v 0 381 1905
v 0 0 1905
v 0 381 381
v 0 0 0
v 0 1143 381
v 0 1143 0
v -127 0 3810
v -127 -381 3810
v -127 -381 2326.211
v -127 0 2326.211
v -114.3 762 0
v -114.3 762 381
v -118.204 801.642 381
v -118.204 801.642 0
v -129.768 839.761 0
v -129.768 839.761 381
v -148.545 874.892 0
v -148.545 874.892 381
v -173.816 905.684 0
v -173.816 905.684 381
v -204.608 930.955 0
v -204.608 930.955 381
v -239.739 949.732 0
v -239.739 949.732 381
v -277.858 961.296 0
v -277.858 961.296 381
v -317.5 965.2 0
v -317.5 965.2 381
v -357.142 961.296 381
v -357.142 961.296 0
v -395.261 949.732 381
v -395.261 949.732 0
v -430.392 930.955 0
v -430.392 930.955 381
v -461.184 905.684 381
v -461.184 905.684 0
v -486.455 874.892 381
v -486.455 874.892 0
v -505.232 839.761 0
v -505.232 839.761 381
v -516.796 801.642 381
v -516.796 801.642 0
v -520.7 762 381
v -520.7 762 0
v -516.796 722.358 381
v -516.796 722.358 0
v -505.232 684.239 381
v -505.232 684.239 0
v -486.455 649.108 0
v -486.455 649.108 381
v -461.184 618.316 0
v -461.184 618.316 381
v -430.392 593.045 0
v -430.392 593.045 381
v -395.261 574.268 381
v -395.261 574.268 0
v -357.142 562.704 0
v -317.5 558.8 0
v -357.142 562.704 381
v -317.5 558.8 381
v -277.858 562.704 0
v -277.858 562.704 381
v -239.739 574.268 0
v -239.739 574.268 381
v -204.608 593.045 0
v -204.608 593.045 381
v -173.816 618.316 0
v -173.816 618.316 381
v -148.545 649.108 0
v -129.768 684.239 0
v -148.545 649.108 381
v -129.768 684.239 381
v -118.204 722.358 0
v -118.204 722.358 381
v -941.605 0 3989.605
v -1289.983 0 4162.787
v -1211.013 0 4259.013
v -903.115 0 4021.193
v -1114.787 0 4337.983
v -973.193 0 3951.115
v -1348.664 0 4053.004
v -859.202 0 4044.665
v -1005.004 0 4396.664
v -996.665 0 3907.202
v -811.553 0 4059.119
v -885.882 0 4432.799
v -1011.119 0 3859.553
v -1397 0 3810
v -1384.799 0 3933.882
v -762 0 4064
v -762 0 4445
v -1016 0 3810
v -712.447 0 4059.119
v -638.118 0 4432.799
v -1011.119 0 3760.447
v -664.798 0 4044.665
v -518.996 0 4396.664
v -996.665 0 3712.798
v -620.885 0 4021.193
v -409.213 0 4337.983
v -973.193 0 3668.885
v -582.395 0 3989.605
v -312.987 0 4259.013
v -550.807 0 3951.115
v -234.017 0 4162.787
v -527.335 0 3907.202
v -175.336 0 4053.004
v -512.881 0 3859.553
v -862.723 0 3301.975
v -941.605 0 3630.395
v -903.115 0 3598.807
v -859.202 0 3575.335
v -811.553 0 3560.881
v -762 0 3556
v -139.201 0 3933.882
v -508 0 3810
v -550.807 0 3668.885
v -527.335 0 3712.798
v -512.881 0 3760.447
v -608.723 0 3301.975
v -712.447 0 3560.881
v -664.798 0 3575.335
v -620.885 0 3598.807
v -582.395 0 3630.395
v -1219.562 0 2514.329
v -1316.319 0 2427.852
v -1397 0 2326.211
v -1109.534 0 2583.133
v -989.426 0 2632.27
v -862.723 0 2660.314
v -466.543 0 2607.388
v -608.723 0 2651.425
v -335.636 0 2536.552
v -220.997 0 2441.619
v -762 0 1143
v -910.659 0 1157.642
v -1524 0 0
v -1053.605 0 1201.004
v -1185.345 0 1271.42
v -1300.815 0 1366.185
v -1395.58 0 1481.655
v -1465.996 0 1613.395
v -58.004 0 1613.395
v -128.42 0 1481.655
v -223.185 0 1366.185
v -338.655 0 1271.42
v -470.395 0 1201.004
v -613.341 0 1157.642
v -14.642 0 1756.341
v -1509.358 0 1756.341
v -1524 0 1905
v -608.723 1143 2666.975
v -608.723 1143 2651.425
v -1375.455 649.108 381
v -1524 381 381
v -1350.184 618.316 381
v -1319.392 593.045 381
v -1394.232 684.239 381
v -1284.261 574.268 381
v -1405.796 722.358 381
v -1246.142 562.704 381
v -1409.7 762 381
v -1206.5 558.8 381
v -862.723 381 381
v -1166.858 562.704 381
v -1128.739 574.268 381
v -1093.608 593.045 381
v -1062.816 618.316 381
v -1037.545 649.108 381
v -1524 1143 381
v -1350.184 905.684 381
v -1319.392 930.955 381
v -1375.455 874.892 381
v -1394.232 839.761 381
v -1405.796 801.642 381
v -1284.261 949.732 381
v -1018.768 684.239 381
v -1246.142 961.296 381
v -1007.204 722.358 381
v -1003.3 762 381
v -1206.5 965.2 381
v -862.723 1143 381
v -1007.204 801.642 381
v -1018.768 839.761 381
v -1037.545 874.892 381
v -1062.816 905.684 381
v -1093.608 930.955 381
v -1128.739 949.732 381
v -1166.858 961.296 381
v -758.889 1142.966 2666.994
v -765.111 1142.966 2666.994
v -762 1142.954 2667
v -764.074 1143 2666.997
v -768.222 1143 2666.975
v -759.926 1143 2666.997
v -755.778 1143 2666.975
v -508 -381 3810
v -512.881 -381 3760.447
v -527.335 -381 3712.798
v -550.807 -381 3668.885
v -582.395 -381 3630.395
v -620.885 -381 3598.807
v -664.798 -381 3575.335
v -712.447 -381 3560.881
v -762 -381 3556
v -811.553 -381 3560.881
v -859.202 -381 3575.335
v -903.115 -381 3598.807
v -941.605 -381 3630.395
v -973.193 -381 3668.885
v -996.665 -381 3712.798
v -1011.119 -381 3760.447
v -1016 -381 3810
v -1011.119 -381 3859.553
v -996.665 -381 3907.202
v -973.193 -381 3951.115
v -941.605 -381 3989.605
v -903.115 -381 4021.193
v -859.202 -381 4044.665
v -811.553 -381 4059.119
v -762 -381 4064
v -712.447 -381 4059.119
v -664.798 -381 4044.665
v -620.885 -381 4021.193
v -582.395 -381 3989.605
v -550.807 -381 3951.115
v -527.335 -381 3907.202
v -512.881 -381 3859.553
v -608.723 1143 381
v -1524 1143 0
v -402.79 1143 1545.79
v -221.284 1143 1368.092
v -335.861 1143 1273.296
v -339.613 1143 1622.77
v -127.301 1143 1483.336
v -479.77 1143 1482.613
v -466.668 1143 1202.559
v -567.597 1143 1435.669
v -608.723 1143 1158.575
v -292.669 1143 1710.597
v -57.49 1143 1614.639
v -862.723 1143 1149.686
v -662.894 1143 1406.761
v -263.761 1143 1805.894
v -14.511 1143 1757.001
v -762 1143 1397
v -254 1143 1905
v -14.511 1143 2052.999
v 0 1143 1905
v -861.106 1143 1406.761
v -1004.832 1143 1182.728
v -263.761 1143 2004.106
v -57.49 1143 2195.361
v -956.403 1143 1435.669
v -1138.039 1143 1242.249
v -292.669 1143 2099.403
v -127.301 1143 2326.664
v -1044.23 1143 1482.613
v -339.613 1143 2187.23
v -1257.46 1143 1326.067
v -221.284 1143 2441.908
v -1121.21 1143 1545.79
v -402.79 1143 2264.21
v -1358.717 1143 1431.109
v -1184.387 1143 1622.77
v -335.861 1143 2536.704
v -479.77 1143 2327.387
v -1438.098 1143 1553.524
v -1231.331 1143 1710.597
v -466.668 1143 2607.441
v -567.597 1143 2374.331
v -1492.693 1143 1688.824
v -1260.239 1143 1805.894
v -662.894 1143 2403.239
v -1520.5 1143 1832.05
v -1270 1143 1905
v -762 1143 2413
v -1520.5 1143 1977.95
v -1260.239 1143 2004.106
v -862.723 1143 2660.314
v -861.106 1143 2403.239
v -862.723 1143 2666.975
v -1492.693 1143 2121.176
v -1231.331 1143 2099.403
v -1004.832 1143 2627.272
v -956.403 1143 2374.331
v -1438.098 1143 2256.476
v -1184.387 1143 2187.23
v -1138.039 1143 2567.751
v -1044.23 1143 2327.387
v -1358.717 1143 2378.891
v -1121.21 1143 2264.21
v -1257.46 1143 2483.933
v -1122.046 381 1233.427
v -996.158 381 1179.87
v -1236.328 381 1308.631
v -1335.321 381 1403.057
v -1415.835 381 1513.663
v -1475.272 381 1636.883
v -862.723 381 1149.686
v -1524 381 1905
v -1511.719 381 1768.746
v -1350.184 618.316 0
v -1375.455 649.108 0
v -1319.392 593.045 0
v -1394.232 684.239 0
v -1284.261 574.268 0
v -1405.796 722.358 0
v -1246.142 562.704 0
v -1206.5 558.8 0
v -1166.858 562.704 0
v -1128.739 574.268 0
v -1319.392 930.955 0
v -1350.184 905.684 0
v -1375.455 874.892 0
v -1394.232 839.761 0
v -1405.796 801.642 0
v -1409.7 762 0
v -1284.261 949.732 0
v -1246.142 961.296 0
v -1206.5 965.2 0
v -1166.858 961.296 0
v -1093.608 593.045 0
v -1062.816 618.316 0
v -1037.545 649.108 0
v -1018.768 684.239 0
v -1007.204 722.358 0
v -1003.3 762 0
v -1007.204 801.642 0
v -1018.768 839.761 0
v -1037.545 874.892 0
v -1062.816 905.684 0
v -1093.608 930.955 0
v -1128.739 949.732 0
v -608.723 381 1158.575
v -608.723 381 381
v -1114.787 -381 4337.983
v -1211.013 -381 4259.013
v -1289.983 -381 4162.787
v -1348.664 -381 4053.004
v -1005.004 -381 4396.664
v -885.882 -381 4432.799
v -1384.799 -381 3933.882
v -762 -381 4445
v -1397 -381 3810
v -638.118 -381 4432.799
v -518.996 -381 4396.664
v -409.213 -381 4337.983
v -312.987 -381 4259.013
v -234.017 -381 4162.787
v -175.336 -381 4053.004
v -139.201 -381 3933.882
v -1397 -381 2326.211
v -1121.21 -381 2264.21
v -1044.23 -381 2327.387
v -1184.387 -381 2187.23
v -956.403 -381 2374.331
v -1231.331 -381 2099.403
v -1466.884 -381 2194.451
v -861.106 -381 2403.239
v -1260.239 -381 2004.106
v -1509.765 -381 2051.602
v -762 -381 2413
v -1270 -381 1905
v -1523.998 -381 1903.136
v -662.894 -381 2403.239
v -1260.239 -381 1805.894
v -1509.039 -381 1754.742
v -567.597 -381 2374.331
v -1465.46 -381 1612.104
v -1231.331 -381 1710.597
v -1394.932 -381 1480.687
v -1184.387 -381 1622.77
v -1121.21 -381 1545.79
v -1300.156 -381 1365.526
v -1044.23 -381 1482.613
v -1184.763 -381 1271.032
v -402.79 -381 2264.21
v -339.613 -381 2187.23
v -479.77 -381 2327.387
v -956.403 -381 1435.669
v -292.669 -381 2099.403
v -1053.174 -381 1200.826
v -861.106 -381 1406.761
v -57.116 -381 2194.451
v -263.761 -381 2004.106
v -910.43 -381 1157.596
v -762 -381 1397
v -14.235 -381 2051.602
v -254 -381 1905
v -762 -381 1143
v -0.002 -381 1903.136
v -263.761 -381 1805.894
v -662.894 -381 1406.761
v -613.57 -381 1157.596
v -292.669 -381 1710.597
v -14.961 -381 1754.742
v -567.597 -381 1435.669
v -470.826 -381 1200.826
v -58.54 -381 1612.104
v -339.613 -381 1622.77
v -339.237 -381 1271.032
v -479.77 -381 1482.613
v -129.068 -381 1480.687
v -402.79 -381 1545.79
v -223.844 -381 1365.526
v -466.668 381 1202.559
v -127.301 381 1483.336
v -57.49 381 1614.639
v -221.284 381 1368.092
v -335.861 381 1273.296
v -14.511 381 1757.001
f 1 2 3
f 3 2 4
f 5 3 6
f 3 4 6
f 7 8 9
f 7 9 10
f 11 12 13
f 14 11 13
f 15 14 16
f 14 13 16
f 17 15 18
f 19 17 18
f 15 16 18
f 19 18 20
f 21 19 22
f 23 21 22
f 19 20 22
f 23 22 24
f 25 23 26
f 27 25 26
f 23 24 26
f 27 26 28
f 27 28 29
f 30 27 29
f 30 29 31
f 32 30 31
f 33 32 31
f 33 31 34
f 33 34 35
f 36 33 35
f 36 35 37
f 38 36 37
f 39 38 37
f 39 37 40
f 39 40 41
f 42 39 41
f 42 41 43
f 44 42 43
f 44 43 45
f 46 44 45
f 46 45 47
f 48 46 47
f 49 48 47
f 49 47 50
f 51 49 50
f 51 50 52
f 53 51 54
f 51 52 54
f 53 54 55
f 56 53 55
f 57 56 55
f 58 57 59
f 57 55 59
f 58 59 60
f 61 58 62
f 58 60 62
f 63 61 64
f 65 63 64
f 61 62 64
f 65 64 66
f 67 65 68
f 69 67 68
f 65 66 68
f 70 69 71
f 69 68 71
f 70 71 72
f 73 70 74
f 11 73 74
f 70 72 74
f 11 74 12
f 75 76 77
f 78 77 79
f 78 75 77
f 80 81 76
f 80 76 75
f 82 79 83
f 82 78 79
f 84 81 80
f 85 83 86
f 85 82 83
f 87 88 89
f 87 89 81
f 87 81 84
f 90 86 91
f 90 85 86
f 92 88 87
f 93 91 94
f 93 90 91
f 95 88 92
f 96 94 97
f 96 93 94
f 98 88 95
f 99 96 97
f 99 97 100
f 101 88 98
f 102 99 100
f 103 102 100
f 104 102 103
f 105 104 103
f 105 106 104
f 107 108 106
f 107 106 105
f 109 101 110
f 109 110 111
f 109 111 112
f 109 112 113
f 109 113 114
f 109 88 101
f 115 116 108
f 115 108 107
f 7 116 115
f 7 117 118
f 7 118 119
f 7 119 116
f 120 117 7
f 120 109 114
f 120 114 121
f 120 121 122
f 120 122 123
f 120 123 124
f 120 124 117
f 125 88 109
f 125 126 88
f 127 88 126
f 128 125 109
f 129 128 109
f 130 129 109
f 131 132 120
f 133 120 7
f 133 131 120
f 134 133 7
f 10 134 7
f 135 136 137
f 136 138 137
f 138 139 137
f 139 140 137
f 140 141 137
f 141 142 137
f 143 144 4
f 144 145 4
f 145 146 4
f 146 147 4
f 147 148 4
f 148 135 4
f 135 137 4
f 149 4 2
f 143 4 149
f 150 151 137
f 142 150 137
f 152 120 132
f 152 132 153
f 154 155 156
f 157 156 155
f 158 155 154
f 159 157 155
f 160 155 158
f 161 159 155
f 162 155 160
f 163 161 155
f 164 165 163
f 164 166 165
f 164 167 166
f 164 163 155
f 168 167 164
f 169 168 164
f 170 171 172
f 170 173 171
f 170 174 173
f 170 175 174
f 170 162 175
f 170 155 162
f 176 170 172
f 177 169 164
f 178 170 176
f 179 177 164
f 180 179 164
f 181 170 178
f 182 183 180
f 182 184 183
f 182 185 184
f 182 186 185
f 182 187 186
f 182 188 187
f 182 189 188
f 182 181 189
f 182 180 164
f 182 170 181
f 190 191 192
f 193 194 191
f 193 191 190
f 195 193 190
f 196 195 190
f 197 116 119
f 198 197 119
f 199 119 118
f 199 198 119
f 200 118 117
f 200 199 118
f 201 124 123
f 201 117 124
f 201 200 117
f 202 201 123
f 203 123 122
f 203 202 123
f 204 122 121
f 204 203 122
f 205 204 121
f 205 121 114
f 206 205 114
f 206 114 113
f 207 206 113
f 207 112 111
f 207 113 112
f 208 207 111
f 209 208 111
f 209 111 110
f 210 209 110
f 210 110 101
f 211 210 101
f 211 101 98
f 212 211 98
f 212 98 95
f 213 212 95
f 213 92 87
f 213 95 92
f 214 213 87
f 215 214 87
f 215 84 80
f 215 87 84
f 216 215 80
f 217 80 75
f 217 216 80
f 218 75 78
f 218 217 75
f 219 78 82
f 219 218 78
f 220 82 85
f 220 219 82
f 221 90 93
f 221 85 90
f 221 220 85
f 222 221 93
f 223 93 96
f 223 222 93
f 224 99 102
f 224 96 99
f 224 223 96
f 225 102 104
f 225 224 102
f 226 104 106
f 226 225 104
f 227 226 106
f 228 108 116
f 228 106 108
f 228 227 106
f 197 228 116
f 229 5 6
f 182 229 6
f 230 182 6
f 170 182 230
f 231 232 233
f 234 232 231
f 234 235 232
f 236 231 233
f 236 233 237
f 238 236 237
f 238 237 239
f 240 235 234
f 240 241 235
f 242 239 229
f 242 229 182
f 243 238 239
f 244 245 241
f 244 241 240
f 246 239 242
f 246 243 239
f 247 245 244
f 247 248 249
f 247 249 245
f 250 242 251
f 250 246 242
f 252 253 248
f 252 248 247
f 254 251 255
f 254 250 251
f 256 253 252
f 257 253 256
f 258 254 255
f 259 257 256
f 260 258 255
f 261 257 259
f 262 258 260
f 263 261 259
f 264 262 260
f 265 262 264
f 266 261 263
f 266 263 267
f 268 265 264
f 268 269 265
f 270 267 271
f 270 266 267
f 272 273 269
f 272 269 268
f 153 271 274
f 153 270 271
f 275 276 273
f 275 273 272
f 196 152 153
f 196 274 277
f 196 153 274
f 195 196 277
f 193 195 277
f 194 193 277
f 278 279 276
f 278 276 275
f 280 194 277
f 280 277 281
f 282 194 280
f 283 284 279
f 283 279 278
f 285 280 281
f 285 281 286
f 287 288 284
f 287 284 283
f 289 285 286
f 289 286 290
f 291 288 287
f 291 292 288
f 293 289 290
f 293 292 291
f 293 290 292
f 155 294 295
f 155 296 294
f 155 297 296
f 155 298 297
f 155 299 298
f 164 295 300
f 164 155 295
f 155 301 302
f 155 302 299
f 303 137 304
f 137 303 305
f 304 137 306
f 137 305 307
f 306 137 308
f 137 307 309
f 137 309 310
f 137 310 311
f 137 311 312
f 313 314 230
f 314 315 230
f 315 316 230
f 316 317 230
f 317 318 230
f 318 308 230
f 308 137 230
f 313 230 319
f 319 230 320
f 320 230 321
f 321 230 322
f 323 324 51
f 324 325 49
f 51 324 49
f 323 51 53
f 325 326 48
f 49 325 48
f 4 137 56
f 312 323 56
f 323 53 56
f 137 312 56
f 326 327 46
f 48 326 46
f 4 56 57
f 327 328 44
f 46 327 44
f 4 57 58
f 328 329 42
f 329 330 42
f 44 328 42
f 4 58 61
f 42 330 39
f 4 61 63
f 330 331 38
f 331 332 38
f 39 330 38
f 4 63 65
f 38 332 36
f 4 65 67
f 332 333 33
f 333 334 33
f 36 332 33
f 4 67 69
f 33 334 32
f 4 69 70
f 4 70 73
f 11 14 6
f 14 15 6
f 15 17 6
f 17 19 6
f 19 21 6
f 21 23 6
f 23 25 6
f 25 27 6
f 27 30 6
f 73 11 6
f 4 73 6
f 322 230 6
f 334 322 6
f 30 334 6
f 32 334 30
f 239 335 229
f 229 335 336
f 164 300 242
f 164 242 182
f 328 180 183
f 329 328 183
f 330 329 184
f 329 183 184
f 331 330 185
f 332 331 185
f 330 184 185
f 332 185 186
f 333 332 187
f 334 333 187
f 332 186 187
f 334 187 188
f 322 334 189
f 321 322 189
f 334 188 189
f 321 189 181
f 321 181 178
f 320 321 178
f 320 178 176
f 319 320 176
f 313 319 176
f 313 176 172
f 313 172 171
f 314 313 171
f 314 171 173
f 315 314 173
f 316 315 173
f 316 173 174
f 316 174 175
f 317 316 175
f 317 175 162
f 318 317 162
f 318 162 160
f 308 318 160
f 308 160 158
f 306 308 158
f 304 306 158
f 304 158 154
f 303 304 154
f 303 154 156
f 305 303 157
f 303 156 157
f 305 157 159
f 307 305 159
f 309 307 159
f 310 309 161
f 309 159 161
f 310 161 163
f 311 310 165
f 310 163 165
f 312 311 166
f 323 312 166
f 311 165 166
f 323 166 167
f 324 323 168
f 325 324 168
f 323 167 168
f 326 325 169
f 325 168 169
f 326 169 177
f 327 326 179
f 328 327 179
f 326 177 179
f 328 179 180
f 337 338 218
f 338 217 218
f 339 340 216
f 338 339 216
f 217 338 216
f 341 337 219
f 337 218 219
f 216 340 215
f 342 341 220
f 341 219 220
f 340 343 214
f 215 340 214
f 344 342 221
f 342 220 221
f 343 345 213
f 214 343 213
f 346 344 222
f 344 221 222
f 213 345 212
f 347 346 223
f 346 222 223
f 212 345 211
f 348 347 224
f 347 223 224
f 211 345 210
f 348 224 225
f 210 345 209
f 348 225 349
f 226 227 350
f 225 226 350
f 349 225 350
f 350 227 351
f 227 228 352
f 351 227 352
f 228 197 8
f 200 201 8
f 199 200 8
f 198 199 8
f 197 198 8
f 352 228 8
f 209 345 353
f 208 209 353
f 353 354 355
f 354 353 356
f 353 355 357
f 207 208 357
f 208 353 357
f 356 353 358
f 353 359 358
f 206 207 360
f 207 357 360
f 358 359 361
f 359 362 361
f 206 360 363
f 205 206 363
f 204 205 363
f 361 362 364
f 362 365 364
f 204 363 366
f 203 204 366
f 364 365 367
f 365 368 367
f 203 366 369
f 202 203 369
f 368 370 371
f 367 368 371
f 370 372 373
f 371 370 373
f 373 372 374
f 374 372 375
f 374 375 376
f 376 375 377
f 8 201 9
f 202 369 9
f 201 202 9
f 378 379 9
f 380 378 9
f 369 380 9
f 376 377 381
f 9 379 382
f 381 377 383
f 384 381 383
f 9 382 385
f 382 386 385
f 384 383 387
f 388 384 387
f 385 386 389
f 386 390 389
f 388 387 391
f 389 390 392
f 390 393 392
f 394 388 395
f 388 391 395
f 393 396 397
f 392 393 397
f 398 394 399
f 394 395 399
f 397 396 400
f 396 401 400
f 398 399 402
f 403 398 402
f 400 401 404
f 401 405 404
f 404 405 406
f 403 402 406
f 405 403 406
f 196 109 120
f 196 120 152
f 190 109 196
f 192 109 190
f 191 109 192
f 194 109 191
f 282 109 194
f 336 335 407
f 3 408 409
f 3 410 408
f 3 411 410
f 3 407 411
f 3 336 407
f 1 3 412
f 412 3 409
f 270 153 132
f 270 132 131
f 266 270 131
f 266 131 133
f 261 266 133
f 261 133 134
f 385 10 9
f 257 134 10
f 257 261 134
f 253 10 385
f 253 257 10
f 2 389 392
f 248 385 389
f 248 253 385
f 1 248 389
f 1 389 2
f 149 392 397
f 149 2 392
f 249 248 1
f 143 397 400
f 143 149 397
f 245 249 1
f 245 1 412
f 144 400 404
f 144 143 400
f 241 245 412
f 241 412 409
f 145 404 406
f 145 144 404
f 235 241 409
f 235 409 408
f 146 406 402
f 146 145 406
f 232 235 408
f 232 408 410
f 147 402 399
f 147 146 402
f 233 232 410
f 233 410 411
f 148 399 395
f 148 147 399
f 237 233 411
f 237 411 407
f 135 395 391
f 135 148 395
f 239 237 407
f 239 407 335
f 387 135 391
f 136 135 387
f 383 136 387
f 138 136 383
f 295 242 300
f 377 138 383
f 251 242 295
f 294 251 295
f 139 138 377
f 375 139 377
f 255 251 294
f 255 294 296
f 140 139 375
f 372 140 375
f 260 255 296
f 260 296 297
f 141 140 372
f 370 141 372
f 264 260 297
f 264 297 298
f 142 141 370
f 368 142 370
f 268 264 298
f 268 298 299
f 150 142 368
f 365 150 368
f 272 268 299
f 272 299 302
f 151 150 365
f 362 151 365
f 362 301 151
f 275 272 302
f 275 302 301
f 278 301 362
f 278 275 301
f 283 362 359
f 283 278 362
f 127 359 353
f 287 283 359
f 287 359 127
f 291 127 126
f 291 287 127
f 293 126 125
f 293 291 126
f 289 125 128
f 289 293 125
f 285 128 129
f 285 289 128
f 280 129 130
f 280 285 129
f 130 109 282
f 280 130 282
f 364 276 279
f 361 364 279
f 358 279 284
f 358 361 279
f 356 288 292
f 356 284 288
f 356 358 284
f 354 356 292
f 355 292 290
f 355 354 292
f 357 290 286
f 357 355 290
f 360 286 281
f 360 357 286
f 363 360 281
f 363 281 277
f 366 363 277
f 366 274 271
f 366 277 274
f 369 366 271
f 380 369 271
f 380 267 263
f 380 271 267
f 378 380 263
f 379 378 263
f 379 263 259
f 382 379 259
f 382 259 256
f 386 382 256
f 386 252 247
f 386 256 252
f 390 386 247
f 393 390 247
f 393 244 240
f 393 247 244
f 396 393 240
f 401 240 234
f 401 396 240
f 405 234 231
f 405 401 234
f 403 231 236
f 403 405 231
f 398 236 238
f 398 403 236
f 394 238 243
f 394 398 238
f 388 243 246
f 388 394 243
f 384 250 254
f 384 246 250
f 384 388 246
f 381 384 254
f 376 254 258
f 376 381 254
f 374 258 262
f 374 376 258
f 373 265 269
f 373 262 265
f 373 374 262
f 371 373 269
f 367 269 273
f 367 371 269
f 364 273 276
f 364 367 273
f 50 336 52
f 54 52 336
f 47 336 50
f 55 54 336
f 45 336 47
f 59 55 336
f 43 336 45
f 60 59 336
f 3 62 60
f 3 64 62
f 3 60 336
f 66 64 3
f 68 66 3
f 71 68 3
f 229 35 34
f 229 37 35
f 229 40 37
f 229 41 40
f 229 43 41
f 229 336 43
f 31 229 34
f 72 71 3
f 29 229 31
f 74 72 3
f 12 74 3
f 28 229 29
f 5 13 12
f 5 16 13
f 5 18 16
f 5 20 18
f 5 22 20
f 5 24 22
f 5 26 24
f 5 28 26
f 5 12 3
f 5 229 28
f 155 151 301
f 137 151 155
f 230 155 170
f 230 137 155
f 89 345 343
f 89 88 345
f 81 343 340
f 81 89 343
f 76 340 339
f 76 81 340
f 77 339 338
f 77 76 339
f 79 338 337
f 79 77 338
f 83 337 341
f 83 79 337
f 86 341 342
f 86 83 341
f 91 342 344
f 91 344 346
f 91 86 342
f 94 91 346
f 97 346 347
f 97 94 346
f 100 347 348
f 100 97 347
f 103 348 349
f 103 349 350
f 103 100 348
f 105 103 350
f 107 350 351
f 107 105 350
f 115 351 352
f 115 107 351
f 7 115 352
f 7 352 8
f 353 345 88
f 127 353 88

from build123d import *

# Parameters (mm, degrees)
SKETCH1_W               = 1524
SKETCH1_H               = 1143
BOSS_EXTRUDE1_DEPTH     = 381
SKETCH4_R               = 203.2
CUT_EXTRUDE1_DEPTH      = 1943.726434679
SKETCH5_R               = 762
BOSS_EXTRUDE2_DEPTH     = 1524
SKETCH6_W               = 1524
SKETCH6_H               = 381
BOSS_EXTRUDE3_DEPTH     = 1524
SKETCH8_W               = 254
SKETCH8_H               = 787.4
BOSS_EXTRUDE4_DEPTH     = 762
SKETCH10_W              = 1270
SKETCH10_H              = 381
BOSS_EXTRUDE5_DEPTH     = 1905
SKETCH11_R              = 635
BOSS_EXTRUDE6_DEPTH     = 381
CUT_EXTRUDE2_DEPTH      = 4837.015922224
CUT_EXTRUDE2_DEPTH_BACK = 4837.015922224
SKETCH12_R              = 254
BOSS_EXTRUDE10_DEPTH    = 254
SKETCH14_W              = 254
SKETCH14_H              = 1143
BOSS_EXTRUDE11_DEPTH    = 25.4
CUT_EXTRUDE3_DEPTH      = 4940.957186049
CUT_EXTRUDE3_DEPTH_BACK = 4940.957186049
SKETCH15_R              = 508


with BuildPart() as part:
    # Sketch1 → Boss-Extrude1 (new body)
    with BuildSketch(Plane.XY):
        with Locations((-762, 571.5)):
            Rectangle(SKETCH1_W, SKETCH1_H)
    extrude(amount=BOSS_EXTRUDE1_DEPTH)

    # Sketch4 → Cut-Extrude1 (cut, through all)
    with BuildSketch(Plane.XY.offset(381)):
        with Locations((-317.5, 762)):
            Circle(SKETCH4_R)
        with Locations((-1206.5, 762)):
            Circle(SKETCH4_R)
    extrude(amount=-CUT_EXTRUDE1_DEPTH, mode=Mode.SUBTRACT)



with BuildPart() as body_2:
    # Sketch5 → Boss-Extrude2 (new body)
    with BuildSketch(Plane(origin=(0, 1143, 0), x_dir=(1, 0, 0), z_dir=(0, 1, 0))):
        with Locations(Location((-762, -1905, 0), (0, 0, 180))):
            Circle(SKETCH5_R)
    extrude(amount=-BOSS_EXTRUDE2_DEPTH)


with BuildPart() as part_1:
    add(part.part)

    add(body_2.part)  # Boss-Extrude3 merges body 2
    # Sketch6 → Boss-Extrude3 (add)
    with BuildSketch(Plane.XY.offset(381)):
        with Locations((-762, 190.5)):
            Rectangle(SKETCH6_W, SKETCH6_H)
    extrude(amount=BOSS_EXTRUDE3_DEPTH)

    # Sketch8 → Boss-Extrude4 (add)
    with BuildSketch(Plane(origin=(0, 381, 0), x_dir=(1, 0, 0), z_dir=(0, 1, 0))):
        with Locations((-735.723112529, -774.7)):
            Rectangle(SKETCH8_W, SKETCH8_H)
    extrude(amount=BOSS_EXTRUDE4_DEPTH)

    # Sketch10 → Boss-Extrude5 (add)
    with BuildSketch(Plane.XY.offset(1905)):
        with Locations((-762, -190.5)):
            Rectangle(SKETCH10_W, SKETCH10_H)
    extrude(amount=BOSS_EXTRUDE5_DEPTH)

    # Sketch11 → Boss-Extrude6 (add)
    with BuildSketch(Plane(origin=(0, 0, 0), x_dir=(1, 0, 0), z_dir=(0, 1, 0))):
        with Locations((-762, -3810)):
            Circle(SKETCH11_R)
    extrude(amount=-BOSS_EXTRUDE6_DEPTH)

    # Sketch12 → Cut-Extrude2 (cut, two sides: drawn at the far end of the back side and taken through both)
    with BuildSketch(Plane(origin=(0, 0, 0), x_dir=(1, 0, 0), z_dir=(0, 1, 0)).offset(-CUT_EXTRUDE2_DEPTH_BACK)):
        with Locations((-762, -3810)):
            Circle(SKETCH12_R)
    extrude(amount=CUT_EXTRUDE2_DEPTH + CUT_EXTRUDE2_DEPTH_BACK, mode=Mode.SUBTRACT)

    # Sketch13 → Boss-Extrude10 (add)
    with BuildSketch(Plane.ZY.offset(862.723112529)):
        Polygon((2666.9746, 1143), (2666.9746, 0), (3301.9746, 0), align=None)
    extrude(amount=-BOSS_EXTRUDE10_DEPTH)

    # Sketch14 → Boss-Extrude11 (add)
    with BuildSketch(Plane(origin=(0, 0, 2666.9746), x_dir=(-1, 0, 0), z_dir=(0, 0, -1))):
        with Locations((735.723112529, 571.5)):
            Rectangle(SKETCH14_W, SKETCH14_H)
    extrude(amount=BOSS_EXTRUDE11_DEPTH)

    # Sketch15 → Cut-Extrude3 (cut, two sides: drawn at the far end of the back side and taken through both)
    with BuildSketch(Plane(origin=(0, 1143, 0), x_dir=(1, 0, 0), z_dir=(0, 1, 0)).offset(-CUT_EXTRUDE3_DEPTH_BACK)):
        with Locations(Location((-762, -1905, 0), (0, 0, 180))):
            Circle(SKETCH15_R)
    extrude(amount=CUT_EXTRUDE3_DEPTH + CUT_EXTRUDE3_DEPTH_BACK, mode=Mode.SUBTRACT)


solid = part_1.part
